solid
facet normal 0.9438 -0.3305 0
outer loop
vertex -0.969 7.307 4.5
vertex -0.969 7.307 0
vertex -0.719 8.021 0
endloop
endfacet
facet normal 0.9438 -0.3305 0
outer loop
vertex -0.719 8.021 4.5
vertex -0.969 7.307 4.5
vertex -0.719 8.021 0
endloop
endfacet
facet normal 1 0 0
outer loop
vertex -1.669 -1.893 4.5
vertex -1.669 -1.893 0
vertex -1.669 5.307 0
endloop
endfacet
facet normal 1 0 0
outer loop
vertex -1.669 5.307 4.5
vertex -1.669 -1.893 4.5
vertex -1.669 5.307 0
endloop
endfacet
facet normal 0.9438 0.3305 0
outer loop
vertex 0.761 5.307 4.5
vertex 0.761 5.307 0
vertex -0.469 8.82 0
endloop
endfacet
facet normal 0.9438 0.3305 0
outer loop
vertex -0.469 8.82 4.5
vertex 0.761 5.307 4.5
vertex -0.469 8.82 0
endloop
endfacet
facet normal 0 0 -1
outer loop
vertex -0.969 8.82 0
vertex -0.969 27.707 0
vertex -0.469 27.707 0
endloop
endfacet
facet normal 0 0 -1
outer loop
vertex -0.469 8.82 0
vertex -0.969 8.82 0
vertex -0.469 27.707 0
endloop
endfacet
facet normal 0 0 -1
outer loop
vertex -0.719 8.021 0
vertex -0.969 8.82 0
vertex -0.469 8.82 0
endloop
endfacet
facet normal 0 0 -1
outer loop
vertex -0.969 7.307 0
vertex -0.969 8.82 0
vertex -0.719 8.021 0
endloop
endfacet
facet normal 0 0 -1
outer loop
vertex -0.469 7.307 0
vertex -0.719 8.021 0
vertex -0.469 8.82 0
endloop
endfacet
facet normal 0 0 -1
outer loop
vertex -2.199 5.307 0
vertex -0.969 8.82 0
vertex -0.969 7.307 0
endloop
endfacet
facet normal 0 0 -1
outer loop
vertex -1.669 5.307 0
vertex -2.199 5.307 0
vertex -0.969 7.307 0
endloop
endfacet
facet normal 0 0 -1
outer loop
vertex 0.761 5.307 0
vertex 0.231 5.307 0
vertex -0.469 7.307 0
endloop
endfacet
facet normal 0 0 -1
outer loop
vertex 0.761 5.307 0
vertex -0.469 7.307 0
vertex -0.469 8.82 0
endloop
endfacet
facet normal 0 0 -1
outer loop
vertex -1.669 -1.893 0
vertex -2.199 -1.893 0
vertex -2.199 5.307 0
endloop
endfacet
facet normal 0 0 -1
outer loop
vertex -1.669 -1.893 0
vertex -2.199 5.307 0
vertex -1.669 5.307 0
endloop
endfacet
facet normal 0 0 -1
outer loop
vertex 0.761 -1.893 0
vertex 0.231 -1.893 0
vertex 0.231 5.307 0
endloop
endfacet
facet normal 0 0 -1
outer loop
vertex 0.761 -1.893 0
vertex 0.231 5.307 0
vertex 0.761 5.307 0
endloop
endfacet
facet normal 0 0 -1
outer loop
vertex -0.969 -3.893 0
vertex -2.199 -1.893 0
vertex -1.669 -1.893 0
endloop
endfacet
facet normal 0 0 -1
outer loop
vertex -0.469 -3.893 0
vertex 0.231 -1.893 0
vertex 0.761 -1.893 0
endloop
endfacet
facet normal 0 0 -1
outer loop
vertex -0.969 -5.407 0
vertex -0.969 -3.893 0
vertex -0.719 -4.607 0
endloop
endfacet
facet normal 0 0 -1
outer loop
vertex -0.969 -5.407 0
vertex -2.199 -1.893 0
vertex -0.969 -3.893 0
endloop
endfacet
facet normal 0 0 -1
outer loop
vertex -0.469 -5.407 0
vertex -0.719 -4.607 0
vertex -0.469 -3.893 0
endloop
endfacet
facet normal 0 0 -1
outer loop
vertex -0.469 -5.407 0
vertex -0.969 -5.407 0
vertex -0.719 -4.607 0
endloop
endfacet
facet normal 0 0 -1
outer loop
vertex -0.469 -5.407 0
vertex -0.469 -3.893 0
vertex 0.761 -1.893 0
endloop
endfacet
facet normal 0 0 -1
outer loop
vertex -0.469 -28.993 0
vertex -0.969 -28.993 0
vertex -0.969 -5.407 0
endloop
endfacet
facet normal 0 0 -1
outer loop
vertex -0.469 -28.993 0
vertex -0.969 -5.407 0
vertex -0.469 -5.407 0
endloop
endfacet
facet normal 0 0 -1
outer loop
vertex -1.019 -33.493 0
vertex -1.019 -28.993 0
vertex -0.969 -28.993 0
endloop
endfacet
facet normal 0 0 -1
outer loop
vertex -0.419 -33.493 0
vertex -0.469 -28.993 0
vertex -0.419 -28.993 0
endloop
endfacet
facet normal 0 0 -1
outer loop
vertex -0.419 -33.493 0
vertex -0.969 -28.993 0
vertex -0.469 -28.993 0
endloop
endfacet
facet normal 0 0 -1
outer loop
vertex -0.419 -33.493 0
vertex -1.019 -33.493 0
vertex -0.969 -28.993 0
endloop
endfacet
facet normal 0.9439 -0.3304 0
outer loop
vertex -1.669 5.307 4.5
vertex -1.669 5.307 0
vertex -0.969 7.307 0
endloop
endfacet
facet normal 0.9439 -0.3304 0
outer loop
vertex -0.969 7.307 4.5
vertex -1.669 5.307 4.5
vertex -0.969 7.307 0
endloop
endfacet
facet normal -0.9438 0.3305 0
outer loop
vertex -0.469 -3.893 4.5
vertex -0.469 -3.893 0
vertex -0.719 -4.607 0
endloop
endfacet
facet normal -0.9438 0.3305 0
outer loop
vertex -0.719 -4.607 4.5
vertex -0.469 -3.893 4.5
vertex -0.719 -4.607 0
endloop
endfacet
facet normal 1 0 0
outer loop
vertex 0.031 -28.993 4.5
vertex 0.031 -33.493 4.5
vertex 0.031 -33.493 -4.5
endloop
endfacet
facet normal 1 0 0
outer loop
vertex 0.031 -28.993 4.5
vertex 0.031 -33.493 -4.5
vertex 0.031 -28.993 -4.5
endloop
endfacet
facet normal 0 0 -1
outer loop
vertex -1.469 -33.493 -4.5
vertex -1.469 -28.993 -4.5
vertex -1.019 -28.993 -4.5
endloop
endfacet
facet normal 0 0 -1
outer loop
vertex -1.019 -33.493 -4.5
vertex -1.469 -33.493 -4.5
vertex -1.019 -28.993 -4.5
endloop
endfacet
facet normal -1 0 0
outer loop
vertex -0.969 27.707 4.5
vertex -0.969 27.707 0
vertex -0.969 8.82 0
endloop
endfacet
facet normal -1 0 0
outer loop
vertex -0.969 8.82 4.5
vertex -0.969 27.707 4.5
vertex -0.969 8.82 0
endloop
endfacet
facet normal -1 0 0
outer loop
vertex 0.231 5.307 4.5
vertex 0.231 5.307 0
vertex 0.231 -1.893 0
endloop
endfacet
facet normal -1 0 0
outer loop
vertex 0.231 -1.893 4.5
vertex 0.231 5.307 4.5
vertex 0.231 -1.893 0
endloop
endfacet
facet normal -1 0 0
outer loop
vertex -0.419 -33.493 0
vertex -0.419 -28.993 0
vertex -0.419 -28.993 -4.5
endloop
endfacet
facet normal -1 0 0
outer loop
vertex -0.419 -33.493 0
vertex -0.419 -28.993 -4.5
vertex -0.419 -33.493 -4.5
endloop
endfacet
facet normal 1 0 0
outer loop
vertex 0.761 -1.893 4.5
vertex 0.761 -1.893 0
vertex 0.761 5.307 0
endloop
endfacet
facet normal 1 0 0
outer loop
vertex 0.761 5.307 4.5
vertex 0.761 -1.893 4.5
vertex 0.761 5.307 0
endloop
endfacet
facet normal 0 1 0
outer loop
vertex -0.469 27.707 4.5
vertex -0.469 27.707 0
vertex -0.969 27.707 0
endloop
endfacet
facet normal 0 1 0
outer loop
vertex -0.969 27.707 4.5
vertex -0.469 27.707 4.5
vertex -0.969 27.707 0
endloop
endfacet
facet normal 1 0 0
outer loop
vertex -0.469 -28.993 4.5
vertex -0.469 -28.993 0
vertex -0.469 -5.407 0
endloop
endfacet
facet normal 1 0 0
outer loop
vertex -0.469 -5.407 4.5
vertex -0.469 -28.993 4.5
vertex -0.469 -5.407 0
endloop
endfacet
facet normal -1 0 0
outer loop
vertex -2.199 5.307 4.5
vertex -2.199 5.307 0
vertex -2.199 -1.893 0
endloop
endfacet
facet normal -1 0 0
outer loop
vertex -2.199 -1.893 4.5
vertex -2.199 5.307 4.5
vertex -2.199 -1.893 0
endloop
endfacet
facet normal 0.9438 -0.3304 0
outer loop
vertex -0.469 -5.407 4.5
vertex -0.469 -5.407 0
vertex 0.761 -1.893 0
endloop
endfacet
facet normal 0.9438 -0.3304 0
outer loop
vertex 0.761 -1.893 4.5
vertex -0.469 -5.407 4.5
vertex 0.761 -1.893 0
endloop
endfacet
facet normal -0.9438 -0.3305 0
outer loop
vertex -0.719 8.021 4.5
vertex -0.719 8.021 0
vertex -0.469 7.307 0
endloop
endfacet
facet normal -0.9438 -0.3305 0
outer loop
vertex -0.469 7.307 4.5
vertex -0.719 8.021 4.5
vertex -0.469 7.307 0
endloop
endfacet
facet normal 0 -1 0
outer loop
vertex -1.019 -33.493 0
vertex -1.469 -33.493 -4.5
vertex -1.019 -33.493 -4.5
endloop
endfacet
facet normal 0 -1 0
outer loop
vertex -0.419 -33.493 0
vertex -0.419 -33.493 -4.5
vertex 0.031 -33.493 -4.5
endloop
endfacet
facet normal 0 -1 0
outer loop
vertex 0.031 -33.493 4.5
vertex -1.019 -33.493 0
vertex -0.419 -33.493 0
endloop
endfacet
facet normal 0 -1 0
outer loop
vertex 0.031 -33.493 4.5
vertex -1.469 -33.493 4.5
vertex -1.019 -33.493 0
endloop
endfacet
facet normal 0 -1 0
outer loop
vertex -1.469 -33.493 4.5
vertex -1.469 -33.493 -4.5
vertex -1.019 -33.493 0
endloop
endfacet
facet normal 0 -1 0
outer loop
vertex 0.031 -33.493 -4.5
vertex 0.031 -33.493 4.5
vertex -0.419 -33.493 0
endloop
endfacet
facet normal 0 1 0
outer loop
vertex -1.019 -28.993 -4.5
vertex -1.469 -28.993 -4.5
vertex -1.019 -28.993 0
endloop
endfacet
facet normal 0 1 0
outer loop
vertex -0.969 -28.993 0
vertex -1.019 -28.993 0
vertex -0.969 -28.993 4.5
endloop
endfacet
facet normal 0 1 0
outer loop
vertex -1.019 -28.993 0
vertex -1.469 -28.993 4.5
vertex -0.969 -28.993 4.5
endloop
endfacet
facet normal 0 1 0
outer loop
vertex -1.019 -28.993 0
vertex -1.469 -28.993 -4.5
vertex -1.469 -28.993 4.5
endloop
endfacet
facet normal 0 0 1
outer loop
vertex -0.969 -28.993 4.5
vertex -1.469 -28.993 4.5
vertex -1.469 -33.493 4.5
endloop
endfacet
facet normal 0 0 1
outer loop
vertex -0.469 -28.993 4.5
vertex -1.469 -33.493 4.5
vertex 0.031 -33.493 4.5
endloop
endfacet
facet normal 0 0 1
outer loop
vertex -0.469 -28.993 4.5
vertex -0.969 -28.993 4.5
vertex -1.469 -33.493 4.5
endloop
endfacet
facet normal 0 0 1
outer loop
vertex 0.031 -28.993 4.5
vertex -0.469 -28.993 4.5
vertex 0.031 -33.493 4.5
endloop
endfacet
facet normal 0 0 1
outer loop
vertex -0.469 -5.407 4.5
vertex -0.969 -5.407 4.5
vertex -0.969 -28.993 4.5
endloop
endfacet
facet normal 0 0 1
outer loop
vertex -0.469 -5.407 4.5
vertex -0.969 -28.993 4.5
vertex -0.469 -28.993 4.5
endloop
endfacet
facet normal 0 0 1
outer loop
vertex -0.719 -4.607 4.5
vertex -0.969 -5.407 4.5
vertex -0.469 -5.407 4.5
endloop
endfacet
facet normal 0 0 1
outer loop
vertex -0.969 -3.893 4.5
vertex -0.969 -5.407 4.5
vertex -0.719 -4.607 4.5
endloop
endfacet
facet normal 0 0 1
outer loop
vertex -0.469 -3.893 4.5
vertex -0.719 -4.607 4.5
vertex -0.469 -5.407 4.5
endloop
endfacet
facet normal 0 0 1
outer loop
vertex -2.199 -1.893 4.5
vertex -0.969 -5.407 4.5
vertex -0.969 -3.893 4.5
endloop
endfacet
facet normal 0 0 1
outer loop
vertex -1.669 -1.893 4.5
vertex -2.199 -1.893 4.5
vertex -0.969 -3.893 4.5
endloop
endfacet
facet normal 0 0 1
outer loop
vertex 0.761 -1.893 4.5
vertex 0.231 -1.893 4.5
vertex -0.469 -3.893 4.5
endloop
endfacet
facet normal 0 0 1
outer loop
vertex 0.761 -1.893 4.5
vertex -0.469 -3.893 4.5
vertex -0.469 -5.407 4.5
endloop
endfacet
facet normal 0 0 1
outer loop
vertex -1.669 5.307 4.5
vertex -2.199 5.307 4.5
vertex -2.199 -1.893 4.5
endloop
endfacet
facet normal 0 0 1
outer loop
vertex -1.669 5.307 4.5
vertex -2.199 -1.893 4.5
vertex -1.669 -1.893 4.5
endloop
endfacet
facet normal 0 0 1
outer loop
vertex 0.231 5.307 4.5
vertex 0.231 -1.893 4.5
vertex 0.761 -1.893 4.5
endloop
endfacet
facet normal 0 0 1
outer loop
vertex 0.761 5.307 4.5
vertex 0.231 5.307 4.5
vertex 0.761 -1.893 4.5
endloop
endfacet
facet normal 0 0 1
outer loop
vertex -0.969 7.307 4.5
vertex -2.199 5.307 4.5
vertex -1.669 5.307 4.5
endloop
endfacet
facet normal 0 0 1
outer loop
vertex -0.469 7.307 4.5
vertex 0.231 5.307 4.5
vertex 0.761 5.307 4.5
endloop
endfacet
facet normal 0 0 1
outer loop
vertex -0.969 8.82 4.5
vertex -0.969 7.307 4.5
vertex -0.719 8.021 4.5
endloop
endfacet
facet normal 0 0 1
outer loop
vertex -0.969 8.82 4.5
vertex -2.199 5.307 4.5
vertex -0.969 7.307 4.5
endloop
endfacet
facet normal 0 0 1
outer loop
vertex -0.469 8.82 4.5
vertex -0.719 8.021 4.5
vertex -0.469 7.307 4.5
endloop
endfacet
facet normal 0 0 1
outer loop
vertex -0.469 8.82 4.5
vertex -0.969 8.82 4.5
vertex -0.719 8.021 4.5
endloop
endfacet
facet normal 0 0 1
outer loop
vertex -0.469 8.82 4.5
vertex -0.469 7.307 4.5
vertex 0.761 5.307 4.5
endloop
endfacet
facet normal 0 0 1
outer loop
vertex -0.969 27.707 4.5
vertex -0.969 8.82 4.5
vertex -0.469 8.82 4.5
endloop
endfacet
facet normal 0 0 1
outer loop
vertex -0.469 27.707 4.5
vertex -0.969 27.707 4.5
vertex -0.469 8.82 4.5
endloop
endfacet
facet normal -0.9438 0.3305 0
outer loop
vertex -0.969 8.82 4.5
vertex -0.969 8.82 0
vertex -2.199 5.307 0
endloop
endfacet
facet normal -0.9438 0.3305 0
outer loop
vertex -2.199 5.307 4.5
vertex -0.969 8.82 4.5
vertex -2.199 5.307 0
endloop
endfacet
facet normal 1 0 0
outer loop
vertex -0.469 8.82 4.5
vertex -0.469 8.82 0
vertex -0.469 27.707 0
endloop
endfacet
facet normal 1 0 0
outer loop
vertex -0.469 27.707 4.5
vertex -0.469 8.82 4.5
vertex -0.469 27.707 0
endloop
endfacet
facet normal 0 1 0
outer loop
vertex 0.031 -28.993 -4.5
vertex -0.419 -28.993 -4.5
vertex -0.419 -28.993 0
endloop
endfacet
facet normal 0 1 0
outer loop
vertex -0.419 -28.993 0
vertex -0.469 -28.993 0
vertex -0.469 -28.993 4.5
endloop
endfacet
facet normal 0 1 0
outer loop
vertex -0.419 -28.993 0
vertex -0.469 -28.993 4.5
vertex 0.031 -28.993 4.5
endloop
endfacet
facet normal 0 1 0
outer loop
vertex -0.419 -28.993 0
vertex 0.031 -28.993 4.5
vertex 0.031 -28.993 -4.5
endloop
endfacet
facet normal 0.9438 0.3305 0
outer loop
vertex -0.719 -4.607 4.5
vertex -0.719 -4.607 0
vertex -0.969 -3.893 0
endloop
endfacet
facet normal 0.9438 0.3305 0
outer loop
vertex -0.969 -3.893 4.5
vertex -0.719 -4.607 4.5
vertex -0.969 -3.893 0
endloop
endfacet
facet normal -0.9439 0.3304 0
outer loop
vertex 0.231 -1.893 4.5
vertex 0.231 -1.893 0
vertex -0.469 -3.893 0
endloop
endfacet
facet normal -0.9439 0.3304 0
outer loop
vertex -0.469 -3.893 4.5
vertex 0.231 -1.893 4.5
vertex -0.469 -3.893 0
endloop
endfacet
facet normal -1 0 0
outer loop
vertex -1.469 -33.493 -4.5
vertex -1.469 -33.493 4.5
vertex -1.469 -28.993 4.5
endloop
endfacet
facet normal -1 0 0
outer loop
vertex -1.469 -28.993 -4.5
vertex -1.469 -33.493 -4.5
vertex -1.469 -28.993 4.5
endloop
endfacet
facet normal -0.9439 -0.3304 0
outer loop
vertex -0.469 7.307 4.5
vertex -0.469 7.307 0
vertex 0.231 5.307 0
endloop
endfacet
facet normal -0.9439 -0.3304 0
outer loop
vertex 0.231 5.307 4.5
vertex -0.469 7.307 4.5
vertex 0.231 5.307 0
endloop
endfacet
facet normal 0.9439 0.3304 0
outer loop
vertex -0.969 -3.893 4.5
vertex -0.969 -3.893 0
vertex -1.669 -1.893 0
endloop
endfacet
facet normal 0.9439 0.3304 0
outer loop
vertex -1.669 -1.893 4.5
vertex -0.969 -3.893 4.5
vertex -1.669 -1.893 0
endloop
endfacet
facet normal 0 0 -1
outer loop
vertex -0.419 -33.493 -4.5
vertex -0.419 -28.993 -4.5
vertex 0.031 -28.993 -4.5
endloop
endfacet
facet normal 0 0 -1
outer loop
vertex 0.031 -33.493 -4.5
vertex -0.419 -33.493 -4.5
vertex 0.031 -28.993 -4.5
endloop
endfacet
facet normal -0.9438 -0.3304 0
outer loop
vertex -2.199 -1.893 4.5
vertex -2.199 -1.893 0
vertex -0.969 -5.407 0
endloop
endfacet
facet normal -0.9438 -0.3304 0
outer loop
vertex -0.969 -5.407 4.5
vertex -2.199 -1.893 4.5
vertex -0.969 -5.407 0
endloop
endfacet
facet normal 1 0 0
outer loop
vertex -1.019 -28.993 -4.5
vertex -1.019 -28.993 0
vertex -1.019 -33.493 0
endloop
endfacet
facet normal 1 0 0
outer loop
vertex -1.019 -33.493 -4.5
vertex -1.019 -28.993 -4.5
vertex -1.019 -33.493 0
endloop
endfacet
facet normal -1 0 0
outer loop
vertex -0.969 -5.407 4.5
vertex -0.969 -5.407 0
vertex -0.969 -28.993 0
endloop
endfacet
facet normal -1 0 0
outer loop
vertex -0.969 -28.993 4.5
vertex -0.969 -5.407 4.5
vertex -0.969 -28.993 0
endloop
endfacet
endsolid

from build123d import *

# Parameters (mm, degrees)
F1_DEPTH = 4.5
F2_W     = 0.5
F2_H     = 4.5
F3_DEPTH = 9
F4_W     = 0.05
F4_H     = 4.5
F5_DEPTH = 25


with BuildPart() as f1:
    # F0 (on Top) → F1 (new body)
    with BuildSketch(Plane.XY):
        Polygon((-0.469149, 27.706926), (-0.969149, 27.706926), (-0.969149, 8.820471), (-2.198889, 5.306926), (-2.198889, -1.893074), (-0.969149, -5.406618), (-0.969149, -33.493074), (-0.469149, -33.493074), (-0.469149, -5.406618), (0.760592, -1.893074), (0.760592, 5.306926), (-0.469149, 8.820471), align=None)
        Polygon((-1.669149, -1.893074), (-1.669149, 5.306926), (-0.969149, 7.306926), (-0.719149, 8.021212), (-0.469149, 7.306926), (0.230851, 5.306926), (0.230851, -1.893074), (-0.469149, -3.893074), (-0.719149, -4.607359), (-0.969149, -3.893074), align=None, mode=Mode.SUBTRACT)
    extrude(amount=F1_DEPTH)

    # F2 (on face) → F3 (join)
    with BuildSketch(Plane.XY.offset(4.5)):
        with Locations((-1.219149, -31.243074)):
            Rectangle(F2_W, F2_H)
        with Locations((-0.219149, -31.243074)):
            Rectangle(F2_W, F2_H)
    extrude(amount=-F3_DEPTH)

    # F4 (on face) → F5 (cut)
    with BuildSketch(Plane(origin=(0, 0, 0), x_dir=(1, 0, 0), z_dir=(0, 0, -1))):
        with Locations((-0.994149, 31.243074)):
            Rectangle(F4_W, F4_H)
        with Locations((-0.444149, 31.243074)):
            Rectangle(F4_W, F4_H)
    extrude(amount=F5_DEPTH, mode=Mode.SUBTRACT)


solid = f1.part
